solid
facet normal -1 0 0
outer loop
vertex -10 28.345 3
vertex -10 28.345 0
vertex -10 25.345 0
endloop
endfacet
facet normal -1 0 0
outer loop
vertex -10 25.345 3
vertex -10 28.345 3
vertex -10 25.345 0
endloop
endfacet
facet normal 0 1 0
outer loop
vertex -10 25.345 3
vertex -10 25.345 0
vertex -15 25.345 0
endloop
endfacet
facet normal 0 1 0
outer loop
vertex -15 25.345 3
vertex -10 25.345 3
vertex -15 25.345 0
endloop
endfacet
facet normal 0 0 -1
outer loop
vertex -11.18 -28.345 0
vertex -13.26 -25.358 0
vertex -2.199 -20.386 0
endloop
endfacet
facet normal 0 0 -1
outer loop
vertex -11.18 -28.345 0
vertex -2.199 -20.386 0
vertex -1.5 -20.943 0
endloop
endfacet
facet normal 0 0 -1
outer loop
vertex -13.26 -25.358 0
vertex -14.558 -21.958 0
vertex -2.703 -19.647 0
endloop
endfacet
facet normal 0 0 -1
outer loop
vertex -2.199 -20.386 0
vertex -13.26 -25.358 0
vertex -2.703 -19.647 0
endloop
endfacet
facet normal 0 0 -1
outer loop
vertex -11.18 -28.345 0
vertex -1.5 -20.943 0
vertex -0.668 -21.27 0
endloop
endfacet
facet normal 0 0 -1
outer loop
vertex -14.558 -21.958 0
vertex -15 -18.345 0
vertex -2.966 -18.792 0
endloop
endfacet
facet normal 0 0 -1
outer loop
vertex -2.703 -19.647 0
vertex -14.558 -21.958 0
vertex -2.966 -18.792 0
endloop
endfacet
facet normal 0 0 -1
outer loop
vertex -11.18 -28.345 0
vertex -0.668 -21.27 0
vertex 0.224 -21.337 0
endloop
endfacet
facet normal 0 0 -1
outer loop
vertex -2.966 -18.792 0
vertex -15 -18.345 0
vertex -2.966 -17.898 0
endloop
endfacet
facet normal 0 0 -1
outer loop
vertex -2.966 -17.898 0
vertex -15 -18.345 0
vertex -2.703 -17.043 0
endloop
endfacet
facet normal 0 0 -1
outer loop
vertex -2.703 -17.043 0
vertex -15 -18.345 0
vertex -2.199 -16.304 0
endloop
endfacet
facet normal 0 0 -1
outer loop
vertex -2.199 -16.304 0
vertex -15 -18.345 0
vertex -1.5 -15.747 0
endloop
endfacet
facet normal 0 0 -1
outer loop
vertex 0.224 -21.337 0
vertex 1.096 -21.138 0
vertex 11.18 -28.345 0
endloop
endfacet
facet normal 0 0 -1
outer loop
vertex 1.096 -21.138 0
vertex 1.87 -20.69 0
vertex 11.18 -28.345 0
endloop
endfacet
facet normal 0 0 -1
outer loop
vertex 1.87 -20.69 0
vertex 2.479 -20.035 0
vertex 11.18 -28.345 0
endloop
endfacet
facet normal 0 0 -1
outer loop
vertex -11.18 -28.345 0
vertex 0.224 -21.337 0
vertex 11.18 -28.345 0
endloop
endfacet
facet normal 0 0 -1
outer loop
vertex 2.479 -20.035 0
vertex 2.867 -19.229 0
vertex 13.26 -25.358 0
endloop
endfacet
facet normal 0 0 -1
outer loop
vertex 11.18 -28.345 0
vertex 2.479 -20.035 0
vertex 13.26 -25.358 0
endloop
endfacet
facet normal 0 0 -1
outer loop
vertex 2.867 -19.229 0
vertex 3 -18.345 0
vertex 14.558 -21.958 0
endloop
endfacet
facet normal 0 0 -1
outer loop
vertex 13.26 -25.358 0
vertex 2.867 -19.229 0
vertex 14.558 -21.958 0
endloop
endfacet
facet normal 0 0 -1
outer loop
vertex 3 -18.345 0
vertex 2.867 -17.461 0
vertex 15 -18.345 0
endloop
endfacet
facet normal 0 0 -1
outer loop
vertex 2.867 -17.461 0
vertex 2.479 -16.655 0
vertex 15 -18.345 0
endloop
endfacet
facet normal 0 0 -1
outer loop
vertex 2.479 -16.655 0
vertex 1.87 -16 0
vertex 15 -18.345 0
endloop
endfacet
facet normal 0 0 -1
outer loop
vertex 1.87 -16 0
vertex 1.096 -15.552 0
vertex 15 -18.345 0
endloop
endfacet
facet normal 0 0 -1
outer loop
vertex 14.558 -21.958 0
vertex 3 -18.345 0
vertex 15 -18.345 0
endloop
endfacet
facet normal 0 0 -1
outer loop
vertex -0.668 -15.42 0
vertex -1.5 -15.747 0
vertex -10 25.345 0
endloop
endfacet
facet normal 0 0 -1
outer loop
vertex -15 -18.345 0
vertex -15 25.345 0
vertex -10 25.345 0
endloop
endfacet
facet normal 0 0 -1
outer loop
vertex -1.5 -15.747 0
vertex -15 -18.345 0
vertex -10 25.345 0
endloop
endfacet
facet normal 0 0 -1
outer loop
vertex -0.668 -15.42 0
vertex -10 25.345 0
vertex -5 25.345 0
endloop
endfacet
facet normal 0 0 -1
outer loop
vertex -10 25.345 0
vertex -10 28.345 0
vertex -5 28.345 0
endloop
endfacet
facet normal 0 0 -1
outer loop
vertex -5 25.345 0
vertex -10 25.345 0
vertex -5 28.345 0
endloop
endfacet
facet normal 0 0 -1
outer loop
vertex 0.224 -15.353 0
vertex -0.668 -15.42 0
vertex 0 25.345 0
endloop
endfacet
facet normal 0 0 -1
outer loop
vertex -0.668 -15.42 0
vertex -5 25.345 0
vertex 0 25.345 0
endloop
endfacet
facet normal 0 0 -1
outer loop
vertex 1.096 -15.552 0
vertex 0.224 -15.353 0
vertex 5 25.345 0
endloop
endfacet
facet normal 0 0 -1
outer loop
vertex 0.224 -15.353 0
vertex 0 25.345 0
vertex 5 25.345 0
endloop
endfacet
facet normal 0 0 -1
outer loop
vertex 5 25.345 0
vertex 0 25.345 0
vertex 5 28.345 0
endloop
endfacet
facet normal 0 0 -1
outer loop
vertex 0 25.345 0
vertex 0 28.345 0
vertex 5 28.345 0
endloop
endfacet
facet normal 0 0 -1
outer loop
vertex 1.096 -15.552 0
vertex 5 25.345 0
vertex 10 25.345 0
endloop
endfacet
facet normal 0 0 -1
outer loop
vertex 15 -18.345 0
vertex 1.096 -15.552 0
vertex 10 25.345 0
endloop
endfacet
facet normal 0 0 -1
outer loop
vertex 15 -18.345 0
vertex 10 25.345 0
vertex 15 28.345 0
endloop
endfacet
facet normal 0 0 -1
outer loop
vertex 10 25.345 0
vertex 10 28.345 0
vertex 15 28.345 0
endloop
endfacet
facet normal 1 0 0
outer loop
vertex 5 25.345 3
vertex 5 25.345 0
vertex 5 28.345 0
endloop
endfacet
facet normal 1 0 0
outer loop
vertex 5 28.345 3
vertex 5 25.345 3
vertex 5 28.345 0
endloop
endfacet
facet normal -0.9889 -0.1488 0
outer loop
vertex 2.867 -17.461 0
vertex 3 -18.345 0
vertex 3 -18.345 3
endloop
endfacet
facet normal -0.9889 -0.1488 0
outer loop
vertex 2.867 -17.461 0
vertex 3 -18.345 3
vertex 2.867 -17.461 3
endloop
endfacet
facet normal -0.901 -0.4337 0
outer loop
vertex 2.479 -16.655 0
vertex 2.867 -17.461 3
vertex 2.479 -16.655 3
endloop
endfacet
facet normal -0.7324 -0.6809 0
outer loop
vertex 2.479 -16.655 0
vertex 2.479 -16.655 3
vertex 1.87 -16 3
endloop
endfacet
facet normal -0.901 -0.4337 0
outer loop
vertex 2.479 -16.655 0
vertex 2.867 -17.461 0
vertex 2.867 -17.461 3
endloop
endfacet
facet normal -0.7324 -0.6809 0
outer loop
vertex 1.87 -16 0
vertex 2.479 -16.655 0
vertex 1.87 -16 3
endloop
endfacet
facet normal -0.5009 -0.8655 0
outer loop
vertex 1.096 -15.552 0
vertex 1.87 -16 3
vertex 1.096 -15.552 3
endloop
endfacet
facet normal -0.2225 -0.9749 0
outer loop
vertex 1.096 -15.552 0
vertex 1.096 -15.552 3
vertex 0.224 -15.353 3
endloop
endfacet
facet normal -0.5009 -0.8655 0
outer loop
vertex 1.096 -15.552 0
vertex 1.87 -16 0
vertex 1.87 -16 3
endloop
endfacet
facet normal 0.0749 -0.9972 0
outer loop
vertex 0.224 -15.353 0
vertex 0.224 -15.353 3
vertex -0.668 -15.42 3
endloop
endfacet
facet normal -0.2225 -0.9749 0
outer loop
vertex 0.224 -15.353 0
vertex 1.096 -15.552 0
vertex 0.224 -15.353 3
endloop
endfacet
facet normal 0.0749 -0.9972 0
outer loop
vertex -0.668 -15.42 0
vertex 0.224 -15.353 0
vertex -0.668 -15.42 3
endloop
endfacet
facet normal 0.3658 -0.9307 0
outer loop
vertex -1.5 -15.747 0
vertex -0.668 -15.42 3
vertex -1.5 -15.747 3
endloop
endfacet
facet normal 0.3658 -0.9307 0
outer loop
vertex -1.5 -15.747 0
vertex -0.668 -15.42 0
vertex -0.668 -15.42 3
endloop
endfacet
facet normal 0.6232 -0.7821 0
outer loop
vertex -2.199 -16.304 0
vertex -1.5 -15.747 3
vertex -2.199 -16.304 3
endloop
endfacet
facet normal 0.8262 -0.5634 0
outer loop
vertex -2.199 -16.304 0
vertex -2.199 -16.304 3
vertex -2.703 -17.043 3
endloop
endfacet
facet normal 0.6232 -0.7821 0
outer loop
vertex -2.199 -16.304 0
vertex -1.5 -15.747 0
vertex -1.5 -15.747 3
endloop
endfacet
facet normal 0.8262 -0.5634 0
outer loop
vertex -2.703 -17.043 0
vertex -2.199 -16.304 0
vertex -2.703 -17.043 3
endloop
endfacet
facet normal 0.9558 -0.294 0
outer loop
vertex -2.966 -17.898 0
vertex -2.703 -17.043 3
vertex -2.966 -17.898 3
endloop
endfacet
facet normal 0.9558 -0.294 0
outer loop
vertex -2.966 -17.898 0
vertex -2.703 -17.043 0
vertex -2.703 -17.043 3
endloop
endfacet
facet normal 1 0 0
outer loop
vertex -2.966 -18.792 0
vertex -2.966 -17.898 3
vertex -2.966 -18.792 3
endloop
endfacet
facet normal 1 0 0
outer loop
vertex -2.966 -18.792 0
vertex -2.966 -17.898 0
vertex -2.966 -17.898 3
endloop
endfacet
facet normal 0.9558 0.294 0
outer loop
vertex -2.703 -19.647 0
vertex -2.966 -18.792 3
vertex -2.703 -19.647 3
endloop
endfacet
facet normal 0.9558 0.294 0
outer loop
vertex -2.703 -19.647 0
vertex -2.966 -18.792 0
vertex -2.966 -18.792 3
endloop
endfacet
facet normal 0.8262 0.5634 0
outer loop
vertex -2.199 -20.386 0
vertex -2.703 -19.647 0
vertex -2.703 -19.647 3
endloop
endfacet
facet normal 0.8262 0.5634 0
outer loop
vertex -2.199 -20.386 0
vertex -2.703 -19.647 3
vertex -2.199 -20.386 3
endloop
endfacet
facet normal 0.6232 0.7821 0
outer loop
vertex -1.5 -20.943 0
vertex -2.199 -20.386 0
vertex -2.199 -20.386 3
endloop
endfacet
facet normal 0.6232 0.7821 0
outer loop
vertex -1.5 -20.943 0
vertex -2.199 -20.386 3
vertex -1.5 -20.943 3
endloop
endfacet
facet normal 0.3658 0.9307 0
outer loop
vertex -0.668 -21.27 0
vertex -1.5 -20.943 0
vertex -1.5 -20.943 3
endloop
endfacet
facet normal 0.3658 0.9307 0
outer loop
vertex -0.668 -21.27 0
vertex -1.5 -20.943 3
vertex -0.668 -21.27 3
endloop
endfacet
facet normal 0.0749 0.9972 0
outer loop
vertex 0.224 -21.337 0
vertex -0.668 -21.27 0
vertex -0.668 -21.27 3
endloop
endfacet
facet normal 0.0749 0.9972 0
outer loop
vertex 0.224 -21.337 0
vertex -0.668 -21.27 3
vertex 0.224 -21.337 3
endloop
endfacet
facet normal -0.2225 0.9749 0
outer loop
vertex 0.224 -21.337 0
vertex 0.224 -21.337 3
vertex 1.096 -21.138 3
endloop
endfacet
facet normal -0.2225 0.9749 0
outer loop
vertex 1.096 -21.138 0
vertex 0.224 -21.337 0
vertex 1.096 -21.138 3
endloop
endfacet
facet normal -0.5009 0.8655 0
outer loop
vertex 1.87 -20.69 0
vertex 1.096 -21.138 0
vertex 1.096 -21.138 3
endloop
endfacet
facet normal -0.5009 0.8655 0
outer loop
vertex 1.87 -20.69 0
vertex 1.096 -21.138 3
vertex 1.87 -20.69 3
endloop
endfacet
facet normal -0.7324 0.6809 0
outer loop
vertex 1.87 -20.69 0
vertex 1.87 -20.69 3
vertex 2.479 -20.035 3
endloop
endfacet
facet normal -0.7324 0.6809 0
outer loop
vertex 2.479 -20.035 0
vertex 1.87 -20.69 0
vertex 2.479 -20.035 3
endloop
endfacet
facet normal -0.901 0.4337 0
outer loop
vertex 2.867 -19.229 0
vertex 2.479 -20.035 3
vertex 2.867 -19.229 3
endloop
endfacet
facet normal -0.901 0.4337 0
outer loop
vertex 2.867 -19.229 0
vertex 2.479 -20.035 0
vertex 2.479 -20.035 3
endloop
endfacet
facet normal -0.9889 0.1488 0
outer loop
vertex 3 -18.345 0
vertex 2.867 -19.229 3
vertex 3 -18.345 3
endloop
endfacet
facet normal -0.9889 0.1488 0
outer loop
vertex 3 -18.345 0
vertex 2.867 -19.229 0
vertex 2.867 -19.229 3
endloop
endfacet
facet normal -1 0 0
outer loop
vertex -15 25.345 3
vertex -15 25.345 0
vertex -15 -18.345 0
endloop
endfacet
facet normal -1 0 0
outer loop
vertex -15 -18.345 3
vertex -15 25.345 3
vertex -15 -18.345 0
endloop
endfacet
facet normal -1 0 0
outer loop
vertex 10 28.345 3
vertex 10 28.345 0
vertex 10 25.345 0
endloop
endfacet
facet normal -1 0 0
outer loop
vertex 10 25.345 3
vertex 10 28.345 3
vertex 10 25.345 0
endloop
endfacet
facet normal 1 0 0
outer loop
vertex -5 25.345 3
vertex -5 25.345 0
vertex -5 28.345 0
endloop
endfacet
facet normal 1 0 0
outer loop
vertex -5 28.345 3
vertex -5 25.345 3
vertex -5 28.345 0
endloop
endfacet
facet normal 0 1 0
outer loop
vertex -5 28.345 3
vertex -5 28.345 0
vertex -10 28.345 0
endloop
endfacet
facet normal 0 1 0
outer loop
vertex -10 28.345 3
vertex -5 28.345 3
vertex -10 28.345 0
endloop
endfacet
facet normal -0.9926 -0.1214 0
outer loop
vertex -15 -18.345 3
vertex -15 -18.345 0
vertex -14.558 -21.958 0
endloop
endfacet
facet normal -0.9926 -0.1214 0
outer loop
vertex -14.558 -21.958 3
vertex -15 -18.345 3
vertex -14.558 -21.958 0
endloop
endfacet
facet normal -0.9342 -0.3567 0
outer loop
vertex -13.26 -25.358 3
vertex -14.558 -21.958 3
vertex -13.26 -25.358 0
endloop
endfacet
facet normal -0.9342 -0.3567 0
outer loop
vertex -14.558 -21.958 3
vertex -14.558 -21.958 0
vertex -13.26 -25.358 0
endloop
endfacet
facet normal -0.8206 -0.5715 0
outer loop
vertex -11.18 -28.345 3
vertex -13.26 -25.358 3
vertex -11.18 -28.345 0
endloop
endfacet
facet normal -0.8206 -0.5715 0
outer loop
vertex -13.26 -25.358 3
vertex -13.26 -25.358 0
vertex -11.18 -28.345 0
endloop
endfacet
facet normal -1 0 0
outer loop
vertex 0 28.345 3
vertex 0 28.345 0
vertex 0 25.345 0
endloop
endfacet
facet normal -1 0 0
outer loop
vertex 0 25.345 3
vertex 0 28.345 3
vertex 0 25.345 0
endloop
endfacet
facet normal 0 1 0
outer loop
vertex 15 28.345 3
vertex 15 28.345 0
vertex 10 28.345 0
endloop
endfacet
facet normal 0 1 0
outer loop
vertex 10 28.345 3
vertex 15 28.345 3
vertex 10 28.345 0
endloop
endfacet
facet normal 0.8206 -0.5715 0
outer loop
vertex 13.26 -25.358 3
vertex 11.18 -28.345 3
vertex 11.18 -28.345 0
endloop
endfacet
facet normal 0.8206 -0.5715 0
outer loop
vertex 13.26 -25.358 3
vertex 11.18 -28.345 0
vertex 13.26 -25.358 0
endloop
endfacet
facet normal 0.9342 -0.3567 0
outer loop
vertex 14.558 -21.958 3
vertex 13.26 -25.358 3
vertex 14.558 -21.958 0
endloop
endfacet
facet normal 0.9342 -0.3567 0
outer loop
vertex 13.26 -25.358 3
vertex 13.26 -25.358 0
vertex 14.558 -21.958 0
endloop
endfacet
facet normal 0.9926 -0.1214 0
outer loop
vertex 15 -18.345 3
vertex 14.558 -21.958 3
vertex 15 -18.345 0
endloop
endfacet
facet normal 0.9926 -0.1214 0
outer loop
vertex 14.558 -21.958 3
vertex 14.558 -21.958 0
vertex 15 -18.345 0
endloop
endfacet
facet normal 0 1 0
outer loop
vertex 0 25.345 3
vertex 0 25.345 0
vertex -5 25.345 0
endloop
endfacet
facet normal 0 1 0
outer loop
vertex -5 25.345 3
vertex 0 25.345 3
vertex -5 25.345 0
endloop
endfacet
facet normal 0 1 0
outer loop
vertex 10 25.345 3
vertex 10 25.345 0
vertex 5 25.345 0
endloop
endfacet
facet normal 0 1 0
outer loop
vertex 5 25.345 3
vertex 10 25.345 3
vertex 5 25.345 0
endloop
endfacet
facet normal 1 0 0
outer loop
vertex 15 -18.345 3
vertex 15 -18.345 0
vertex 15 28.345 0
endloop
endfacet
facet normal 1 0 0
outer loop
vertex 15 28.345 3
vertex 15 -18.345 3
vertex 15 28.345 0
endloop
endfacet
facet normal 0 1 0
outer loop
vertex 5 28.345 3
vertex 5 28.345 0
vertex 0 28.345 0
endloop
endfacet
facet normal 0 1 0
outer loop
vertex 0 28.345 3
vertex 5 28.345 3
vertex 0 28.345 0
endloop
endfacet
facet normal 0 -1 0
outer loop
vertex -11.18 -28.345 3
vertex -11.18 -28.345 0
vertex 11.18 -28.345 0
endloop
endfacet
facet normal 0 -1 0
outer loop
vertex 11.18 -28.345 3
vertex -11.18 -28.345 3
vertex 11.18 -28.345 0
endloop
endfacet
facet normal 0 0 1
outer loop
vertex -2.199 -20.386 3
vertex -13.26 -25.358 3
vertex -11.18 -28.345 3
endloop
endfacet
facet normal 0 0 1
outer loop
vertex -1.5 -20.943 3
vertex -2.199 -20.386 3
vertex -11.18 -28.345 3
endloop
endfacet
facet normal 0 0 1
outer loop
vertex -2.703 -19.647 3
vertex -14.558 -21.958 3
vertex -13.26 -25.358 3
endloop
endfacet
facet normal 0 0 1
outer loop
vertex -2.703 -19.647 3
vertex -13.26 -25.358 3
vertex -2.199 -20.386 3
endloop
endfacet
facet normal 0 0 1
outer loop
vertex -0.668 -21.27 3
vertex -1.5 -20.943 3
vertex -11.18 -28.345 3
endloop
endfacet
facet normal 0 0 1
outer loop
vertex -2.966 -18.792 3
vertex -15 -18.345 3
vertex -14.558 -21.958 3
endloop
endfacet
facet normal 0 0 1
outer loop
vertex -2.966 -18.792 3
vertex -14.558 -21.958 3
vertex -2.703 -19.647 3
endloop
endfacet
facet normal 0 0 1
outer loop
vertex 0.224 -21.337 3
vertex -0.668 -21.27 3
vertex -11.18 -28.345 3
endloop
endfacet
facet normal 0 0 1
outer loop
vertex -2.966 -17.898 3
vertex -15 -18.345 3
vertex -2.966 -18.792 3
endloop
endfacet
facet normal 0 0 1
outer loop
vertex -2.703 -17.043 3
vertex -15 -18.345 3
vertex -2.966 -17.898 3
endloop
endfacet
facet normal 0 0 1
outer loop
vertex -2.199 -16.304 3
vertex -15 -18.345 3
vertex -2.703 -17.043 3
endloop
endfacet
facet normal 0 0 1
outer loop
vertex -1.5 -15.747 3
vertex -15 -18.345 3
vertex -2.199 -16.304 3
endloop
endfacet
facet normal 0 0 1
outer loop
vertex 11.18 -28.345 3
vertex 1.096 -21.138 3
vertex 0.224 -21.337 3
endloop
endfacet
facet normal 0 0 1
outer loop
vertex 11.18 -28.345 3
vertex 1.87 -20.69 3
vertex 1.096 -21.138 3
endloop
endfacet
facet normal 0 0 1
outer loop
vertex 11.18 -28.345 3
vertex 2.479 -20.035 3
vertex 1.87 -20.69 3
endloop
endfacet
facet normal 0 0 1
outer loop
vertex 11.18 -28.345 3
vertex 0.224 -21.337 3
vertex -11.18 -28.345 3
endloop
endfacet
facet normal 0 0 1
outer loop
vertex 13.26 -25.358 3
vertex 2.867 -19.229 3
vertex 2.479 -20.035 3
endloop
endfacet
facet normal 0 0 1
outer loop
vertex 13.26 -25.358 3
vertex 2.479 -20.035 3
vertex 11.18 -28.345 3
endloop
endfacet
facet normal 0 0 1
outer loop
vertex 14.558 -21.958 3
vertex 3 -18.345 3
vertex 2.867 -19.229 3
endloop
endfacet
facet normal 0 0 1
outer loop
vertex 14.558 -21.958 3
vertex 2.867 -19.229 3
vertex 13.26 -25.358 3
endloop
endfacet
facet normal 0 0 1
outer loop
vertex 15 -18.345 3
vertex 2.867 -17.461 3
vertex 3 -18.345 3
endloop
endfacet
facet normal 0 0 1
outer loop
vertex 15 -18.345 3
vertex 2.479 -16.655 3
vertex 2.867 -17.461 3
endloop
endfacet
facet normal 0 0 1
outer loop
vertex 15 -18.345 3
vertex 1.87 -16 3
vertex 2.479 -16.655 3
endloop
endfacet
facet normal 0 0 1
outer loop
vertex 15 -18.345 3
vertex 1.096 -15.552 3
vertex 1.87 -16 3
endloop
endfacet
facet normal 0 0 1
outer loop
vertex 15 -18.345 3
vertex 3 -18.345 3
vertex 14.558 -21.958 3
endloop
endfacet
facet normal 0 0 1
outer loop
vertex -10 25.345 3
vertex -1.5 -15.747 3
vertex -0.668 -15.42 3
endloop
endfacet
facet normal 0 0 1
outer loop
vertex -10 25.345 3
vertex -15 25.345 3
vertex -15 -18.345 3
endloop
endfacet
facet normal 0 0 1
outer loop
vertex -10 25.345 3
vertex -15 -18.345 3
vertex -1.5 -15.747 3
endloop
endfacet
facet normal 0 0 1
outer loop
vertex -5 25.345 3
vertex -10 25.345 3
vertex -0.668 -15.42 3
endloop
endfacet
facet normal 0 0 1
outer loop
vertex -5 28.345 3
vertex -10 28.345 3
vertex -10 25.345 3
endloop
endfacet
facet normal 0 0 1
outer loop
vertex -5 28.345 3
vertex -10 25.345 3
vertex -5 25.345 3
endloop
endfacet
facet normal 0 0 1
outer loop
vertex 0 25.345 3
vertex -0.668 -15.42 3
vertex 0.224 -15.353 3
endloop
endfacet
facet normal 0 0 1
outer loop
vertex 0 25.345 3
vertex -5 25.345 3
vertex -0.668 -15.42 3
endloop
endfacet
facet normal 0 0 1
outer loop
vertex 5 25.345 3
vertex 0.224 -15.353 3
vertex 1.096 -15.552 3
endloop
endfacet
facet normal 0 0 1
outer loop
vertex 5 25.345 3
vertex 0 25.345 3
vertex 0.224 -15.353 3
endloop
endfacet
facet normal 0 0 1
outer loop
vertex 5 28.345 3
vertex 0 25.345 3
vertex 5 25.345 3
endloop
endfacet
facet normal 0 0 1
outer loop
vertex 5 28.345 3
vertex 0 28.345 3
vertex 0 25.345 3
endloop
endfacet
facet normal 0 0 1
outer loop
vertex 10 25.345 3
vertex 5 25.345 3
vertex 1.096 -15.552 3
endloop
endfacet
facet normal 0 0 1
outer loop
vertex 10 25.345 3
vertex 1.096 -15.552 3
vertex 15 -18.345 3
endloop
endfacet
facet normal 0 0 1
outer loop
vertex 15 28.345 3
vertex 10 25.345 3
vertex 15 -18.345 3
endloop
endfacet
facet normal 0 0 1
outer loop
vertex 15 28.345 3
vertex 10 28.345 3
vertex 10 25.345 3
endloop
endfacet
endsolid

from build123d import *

# Parameters (mm, degrees)
CROQUIS1_R              = 3
SALIENTE_EXTRUIR1_DEPTH = 3
CORTAR_EXTRUIR1_DEPTH   = 3


with BuildPart() as part:
    # Croquis1 → Saliente-Extruir1 (new body)
    with BuildSketch(Plane.XY):
        Polygon((-15, -28.345), (15, -28.345), (15, 28.345), (10, 28.345), (10, 25.345), (5, 25.345), (5, 28.345), (0, 28.345), (0, 25.345), (-5, 25.345), (-5, 28.345), (-10, 28.345), (-10, 25.345), (-15, 25.345), align=None)
        with Locations((0, -18.345)):
            Circle(CROQUIS1_R, mode=Mode.SUBTRACT)
    extrude(amount=SALIENTE_EXTRUIR1_DEPTH)

    # Croquis2 → Cortar-Extruir1 (cut)
    with BuildSketch(Plane(origin=(0, 0, 0), x_dir=(-1, 0, 0), z_dir=(0, 0, -1))):
        with BuildLine():
            Line((-15, -18.345), (-21.186751232, -18.345))
            Line((-21.186751232, -18.345), (-21.186751232, -37.148085908))
            Line((-21.186751232, -37.148085908), (21.188955731, -37.148085908))
            Line((21.188955731, -37.148085908), (21.188955731, -18.345))
            Line((21.188955731, -18.345), (15, -18.345))
            ThreePointArc((15, -18.345), (0, -33.345), (-15, -18.345))
        make_face()
    extrude(amount=-CORTAR_EXTRUIR1_DEPTH, mode=Mode.SUBTRACT)


solid = part.part
